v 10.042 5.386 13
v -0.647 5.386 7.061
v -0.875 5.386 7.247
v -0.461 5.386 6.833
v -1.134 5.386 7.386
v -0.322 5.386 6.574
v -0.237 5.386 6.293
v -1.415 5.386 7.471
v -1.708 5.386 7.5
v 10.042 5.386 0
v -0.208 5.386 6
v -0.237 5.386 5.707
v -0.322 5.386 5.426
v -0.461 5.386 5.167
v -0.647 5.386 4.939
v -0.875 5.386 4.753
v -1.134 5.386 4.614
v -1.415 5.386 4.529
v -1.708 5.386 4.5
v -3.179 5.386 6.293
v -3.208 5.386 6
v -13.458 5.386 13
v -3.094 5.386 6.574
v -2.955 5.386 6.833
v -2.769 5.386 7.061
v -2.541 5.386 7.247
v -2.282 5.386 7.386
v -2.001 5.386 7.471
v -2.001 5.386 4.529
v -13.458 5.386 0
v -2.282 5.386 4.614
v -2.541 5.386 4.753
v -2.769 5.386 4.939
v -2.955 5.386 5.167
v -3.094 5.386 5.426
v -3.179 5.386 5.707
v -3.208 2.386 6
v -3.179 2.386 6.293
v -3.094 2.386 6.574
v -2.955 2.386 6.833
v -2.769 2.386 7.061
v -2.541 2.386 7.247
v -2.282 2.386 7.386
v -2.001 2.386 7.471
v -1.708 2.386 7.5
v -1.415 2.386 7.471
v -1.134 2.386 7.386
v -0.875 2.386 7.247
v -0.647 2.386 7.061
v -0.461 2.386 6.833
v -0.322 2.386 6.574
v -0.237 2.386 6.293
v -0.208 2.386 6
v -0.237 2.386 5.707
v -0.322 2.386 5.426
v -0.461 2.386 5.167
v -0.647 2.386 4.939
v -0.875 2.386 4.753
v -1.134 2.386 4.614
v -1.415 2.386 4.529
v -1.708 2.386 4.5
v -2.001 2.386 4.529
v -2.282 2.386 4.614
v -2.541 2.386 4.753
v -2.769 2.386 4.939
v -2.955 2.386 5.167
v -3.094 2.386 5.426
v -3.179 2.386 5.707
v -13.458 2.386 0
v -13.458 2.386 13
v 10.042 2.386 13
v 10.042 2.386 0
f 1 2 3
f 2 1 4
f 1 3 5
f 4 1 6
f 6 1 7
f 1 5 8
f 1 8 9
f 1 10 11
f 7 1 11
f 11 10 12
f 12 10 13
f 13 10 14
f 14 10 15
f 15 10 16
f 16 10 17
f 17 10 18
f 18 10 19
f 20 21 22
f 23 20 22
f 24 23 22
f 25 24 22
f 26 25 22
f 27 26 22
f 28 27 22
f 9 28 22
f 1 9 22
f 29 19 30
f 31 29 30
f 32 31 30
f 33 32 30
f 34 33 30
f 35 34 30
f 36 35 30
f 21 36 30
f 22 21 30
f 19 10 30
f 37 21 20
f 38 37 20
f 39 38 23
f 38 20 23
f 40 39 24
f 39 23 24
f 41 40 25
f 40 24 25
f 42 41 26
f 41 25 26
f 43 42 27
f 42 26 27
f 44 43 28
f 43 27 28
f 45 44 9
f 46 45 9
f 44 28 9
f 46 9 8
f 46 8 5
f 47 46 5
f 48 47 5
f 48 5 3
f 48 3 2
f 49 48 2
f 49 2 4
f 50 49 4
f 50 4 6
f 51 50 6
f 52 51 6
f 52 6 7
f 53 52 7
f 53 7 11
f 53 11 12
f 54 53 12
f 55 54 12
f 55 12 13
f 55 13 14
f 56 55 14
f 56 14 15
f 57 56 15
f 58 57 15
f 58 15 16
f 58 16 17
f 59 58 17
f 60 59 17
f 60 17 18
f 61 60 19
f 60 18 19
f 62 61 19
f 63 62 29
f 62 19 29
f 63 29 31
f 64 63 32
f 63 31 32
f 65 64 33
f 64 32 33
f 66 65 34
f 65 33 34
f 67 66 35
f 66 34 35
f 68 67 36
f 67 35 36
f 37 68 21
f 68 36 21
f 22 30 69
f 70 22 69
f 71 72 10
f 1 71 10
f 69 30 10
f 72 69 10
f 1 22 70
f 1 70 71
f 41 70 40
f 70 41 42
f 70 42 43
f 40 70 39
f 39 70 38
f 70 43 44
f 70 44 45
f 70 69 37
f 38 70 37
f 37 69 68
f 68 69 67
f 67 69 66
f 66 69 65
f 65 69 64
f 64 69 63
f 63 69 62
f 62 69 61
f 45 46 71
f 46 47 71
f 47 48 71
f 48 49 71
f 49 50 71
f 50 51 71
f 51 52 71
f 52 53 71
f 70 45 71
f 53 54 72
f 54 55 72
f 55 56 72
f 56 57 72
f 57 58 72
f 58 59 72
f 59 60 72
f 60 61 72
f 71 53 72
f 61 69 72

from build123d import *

# Parameters (mm, degrees)
RESSALTO_EXTRUS_O2_DEPTH = 13
ESBO_O3_R                = 1.5
CORTE_EXTRUS_O2_DEPTH    = 13


with BuildPart() as part:
    # Esboço1 → Ressalto-extrusão2 (new body)
    with BuildSketch(Plane.XY):
        Polygon((-7.457901998, 2.385917031), (-7.230517524, 2.385917031), (4.042098002, 2.385917031), (10.042098002, 2.385917031), (10.042098002, 5.385917031), (-13.457901998, 5.385917031), (-13.457901998, 2.385917031), align=None)
    extrude(amount=RESSALTO_EXTRUS_O2_DEPTH)

    # Esboço3 → Corte-extrusão2 (cut)
    with BuildSketch(Plane(origin=(0, 5.385917031, 0), x_dir=(1, 0, 0), z_dir=(0, 1, 0))):
        with Locations(Location((-1.707901998, -6, 0), (0, 0, 180))):
            Circle(ESBO_O3_R)
    extrude(amount=-CORTE_EXTRUS_O2_DEPTH, mode=Mode.SUBTRACT)


solid = part.part
